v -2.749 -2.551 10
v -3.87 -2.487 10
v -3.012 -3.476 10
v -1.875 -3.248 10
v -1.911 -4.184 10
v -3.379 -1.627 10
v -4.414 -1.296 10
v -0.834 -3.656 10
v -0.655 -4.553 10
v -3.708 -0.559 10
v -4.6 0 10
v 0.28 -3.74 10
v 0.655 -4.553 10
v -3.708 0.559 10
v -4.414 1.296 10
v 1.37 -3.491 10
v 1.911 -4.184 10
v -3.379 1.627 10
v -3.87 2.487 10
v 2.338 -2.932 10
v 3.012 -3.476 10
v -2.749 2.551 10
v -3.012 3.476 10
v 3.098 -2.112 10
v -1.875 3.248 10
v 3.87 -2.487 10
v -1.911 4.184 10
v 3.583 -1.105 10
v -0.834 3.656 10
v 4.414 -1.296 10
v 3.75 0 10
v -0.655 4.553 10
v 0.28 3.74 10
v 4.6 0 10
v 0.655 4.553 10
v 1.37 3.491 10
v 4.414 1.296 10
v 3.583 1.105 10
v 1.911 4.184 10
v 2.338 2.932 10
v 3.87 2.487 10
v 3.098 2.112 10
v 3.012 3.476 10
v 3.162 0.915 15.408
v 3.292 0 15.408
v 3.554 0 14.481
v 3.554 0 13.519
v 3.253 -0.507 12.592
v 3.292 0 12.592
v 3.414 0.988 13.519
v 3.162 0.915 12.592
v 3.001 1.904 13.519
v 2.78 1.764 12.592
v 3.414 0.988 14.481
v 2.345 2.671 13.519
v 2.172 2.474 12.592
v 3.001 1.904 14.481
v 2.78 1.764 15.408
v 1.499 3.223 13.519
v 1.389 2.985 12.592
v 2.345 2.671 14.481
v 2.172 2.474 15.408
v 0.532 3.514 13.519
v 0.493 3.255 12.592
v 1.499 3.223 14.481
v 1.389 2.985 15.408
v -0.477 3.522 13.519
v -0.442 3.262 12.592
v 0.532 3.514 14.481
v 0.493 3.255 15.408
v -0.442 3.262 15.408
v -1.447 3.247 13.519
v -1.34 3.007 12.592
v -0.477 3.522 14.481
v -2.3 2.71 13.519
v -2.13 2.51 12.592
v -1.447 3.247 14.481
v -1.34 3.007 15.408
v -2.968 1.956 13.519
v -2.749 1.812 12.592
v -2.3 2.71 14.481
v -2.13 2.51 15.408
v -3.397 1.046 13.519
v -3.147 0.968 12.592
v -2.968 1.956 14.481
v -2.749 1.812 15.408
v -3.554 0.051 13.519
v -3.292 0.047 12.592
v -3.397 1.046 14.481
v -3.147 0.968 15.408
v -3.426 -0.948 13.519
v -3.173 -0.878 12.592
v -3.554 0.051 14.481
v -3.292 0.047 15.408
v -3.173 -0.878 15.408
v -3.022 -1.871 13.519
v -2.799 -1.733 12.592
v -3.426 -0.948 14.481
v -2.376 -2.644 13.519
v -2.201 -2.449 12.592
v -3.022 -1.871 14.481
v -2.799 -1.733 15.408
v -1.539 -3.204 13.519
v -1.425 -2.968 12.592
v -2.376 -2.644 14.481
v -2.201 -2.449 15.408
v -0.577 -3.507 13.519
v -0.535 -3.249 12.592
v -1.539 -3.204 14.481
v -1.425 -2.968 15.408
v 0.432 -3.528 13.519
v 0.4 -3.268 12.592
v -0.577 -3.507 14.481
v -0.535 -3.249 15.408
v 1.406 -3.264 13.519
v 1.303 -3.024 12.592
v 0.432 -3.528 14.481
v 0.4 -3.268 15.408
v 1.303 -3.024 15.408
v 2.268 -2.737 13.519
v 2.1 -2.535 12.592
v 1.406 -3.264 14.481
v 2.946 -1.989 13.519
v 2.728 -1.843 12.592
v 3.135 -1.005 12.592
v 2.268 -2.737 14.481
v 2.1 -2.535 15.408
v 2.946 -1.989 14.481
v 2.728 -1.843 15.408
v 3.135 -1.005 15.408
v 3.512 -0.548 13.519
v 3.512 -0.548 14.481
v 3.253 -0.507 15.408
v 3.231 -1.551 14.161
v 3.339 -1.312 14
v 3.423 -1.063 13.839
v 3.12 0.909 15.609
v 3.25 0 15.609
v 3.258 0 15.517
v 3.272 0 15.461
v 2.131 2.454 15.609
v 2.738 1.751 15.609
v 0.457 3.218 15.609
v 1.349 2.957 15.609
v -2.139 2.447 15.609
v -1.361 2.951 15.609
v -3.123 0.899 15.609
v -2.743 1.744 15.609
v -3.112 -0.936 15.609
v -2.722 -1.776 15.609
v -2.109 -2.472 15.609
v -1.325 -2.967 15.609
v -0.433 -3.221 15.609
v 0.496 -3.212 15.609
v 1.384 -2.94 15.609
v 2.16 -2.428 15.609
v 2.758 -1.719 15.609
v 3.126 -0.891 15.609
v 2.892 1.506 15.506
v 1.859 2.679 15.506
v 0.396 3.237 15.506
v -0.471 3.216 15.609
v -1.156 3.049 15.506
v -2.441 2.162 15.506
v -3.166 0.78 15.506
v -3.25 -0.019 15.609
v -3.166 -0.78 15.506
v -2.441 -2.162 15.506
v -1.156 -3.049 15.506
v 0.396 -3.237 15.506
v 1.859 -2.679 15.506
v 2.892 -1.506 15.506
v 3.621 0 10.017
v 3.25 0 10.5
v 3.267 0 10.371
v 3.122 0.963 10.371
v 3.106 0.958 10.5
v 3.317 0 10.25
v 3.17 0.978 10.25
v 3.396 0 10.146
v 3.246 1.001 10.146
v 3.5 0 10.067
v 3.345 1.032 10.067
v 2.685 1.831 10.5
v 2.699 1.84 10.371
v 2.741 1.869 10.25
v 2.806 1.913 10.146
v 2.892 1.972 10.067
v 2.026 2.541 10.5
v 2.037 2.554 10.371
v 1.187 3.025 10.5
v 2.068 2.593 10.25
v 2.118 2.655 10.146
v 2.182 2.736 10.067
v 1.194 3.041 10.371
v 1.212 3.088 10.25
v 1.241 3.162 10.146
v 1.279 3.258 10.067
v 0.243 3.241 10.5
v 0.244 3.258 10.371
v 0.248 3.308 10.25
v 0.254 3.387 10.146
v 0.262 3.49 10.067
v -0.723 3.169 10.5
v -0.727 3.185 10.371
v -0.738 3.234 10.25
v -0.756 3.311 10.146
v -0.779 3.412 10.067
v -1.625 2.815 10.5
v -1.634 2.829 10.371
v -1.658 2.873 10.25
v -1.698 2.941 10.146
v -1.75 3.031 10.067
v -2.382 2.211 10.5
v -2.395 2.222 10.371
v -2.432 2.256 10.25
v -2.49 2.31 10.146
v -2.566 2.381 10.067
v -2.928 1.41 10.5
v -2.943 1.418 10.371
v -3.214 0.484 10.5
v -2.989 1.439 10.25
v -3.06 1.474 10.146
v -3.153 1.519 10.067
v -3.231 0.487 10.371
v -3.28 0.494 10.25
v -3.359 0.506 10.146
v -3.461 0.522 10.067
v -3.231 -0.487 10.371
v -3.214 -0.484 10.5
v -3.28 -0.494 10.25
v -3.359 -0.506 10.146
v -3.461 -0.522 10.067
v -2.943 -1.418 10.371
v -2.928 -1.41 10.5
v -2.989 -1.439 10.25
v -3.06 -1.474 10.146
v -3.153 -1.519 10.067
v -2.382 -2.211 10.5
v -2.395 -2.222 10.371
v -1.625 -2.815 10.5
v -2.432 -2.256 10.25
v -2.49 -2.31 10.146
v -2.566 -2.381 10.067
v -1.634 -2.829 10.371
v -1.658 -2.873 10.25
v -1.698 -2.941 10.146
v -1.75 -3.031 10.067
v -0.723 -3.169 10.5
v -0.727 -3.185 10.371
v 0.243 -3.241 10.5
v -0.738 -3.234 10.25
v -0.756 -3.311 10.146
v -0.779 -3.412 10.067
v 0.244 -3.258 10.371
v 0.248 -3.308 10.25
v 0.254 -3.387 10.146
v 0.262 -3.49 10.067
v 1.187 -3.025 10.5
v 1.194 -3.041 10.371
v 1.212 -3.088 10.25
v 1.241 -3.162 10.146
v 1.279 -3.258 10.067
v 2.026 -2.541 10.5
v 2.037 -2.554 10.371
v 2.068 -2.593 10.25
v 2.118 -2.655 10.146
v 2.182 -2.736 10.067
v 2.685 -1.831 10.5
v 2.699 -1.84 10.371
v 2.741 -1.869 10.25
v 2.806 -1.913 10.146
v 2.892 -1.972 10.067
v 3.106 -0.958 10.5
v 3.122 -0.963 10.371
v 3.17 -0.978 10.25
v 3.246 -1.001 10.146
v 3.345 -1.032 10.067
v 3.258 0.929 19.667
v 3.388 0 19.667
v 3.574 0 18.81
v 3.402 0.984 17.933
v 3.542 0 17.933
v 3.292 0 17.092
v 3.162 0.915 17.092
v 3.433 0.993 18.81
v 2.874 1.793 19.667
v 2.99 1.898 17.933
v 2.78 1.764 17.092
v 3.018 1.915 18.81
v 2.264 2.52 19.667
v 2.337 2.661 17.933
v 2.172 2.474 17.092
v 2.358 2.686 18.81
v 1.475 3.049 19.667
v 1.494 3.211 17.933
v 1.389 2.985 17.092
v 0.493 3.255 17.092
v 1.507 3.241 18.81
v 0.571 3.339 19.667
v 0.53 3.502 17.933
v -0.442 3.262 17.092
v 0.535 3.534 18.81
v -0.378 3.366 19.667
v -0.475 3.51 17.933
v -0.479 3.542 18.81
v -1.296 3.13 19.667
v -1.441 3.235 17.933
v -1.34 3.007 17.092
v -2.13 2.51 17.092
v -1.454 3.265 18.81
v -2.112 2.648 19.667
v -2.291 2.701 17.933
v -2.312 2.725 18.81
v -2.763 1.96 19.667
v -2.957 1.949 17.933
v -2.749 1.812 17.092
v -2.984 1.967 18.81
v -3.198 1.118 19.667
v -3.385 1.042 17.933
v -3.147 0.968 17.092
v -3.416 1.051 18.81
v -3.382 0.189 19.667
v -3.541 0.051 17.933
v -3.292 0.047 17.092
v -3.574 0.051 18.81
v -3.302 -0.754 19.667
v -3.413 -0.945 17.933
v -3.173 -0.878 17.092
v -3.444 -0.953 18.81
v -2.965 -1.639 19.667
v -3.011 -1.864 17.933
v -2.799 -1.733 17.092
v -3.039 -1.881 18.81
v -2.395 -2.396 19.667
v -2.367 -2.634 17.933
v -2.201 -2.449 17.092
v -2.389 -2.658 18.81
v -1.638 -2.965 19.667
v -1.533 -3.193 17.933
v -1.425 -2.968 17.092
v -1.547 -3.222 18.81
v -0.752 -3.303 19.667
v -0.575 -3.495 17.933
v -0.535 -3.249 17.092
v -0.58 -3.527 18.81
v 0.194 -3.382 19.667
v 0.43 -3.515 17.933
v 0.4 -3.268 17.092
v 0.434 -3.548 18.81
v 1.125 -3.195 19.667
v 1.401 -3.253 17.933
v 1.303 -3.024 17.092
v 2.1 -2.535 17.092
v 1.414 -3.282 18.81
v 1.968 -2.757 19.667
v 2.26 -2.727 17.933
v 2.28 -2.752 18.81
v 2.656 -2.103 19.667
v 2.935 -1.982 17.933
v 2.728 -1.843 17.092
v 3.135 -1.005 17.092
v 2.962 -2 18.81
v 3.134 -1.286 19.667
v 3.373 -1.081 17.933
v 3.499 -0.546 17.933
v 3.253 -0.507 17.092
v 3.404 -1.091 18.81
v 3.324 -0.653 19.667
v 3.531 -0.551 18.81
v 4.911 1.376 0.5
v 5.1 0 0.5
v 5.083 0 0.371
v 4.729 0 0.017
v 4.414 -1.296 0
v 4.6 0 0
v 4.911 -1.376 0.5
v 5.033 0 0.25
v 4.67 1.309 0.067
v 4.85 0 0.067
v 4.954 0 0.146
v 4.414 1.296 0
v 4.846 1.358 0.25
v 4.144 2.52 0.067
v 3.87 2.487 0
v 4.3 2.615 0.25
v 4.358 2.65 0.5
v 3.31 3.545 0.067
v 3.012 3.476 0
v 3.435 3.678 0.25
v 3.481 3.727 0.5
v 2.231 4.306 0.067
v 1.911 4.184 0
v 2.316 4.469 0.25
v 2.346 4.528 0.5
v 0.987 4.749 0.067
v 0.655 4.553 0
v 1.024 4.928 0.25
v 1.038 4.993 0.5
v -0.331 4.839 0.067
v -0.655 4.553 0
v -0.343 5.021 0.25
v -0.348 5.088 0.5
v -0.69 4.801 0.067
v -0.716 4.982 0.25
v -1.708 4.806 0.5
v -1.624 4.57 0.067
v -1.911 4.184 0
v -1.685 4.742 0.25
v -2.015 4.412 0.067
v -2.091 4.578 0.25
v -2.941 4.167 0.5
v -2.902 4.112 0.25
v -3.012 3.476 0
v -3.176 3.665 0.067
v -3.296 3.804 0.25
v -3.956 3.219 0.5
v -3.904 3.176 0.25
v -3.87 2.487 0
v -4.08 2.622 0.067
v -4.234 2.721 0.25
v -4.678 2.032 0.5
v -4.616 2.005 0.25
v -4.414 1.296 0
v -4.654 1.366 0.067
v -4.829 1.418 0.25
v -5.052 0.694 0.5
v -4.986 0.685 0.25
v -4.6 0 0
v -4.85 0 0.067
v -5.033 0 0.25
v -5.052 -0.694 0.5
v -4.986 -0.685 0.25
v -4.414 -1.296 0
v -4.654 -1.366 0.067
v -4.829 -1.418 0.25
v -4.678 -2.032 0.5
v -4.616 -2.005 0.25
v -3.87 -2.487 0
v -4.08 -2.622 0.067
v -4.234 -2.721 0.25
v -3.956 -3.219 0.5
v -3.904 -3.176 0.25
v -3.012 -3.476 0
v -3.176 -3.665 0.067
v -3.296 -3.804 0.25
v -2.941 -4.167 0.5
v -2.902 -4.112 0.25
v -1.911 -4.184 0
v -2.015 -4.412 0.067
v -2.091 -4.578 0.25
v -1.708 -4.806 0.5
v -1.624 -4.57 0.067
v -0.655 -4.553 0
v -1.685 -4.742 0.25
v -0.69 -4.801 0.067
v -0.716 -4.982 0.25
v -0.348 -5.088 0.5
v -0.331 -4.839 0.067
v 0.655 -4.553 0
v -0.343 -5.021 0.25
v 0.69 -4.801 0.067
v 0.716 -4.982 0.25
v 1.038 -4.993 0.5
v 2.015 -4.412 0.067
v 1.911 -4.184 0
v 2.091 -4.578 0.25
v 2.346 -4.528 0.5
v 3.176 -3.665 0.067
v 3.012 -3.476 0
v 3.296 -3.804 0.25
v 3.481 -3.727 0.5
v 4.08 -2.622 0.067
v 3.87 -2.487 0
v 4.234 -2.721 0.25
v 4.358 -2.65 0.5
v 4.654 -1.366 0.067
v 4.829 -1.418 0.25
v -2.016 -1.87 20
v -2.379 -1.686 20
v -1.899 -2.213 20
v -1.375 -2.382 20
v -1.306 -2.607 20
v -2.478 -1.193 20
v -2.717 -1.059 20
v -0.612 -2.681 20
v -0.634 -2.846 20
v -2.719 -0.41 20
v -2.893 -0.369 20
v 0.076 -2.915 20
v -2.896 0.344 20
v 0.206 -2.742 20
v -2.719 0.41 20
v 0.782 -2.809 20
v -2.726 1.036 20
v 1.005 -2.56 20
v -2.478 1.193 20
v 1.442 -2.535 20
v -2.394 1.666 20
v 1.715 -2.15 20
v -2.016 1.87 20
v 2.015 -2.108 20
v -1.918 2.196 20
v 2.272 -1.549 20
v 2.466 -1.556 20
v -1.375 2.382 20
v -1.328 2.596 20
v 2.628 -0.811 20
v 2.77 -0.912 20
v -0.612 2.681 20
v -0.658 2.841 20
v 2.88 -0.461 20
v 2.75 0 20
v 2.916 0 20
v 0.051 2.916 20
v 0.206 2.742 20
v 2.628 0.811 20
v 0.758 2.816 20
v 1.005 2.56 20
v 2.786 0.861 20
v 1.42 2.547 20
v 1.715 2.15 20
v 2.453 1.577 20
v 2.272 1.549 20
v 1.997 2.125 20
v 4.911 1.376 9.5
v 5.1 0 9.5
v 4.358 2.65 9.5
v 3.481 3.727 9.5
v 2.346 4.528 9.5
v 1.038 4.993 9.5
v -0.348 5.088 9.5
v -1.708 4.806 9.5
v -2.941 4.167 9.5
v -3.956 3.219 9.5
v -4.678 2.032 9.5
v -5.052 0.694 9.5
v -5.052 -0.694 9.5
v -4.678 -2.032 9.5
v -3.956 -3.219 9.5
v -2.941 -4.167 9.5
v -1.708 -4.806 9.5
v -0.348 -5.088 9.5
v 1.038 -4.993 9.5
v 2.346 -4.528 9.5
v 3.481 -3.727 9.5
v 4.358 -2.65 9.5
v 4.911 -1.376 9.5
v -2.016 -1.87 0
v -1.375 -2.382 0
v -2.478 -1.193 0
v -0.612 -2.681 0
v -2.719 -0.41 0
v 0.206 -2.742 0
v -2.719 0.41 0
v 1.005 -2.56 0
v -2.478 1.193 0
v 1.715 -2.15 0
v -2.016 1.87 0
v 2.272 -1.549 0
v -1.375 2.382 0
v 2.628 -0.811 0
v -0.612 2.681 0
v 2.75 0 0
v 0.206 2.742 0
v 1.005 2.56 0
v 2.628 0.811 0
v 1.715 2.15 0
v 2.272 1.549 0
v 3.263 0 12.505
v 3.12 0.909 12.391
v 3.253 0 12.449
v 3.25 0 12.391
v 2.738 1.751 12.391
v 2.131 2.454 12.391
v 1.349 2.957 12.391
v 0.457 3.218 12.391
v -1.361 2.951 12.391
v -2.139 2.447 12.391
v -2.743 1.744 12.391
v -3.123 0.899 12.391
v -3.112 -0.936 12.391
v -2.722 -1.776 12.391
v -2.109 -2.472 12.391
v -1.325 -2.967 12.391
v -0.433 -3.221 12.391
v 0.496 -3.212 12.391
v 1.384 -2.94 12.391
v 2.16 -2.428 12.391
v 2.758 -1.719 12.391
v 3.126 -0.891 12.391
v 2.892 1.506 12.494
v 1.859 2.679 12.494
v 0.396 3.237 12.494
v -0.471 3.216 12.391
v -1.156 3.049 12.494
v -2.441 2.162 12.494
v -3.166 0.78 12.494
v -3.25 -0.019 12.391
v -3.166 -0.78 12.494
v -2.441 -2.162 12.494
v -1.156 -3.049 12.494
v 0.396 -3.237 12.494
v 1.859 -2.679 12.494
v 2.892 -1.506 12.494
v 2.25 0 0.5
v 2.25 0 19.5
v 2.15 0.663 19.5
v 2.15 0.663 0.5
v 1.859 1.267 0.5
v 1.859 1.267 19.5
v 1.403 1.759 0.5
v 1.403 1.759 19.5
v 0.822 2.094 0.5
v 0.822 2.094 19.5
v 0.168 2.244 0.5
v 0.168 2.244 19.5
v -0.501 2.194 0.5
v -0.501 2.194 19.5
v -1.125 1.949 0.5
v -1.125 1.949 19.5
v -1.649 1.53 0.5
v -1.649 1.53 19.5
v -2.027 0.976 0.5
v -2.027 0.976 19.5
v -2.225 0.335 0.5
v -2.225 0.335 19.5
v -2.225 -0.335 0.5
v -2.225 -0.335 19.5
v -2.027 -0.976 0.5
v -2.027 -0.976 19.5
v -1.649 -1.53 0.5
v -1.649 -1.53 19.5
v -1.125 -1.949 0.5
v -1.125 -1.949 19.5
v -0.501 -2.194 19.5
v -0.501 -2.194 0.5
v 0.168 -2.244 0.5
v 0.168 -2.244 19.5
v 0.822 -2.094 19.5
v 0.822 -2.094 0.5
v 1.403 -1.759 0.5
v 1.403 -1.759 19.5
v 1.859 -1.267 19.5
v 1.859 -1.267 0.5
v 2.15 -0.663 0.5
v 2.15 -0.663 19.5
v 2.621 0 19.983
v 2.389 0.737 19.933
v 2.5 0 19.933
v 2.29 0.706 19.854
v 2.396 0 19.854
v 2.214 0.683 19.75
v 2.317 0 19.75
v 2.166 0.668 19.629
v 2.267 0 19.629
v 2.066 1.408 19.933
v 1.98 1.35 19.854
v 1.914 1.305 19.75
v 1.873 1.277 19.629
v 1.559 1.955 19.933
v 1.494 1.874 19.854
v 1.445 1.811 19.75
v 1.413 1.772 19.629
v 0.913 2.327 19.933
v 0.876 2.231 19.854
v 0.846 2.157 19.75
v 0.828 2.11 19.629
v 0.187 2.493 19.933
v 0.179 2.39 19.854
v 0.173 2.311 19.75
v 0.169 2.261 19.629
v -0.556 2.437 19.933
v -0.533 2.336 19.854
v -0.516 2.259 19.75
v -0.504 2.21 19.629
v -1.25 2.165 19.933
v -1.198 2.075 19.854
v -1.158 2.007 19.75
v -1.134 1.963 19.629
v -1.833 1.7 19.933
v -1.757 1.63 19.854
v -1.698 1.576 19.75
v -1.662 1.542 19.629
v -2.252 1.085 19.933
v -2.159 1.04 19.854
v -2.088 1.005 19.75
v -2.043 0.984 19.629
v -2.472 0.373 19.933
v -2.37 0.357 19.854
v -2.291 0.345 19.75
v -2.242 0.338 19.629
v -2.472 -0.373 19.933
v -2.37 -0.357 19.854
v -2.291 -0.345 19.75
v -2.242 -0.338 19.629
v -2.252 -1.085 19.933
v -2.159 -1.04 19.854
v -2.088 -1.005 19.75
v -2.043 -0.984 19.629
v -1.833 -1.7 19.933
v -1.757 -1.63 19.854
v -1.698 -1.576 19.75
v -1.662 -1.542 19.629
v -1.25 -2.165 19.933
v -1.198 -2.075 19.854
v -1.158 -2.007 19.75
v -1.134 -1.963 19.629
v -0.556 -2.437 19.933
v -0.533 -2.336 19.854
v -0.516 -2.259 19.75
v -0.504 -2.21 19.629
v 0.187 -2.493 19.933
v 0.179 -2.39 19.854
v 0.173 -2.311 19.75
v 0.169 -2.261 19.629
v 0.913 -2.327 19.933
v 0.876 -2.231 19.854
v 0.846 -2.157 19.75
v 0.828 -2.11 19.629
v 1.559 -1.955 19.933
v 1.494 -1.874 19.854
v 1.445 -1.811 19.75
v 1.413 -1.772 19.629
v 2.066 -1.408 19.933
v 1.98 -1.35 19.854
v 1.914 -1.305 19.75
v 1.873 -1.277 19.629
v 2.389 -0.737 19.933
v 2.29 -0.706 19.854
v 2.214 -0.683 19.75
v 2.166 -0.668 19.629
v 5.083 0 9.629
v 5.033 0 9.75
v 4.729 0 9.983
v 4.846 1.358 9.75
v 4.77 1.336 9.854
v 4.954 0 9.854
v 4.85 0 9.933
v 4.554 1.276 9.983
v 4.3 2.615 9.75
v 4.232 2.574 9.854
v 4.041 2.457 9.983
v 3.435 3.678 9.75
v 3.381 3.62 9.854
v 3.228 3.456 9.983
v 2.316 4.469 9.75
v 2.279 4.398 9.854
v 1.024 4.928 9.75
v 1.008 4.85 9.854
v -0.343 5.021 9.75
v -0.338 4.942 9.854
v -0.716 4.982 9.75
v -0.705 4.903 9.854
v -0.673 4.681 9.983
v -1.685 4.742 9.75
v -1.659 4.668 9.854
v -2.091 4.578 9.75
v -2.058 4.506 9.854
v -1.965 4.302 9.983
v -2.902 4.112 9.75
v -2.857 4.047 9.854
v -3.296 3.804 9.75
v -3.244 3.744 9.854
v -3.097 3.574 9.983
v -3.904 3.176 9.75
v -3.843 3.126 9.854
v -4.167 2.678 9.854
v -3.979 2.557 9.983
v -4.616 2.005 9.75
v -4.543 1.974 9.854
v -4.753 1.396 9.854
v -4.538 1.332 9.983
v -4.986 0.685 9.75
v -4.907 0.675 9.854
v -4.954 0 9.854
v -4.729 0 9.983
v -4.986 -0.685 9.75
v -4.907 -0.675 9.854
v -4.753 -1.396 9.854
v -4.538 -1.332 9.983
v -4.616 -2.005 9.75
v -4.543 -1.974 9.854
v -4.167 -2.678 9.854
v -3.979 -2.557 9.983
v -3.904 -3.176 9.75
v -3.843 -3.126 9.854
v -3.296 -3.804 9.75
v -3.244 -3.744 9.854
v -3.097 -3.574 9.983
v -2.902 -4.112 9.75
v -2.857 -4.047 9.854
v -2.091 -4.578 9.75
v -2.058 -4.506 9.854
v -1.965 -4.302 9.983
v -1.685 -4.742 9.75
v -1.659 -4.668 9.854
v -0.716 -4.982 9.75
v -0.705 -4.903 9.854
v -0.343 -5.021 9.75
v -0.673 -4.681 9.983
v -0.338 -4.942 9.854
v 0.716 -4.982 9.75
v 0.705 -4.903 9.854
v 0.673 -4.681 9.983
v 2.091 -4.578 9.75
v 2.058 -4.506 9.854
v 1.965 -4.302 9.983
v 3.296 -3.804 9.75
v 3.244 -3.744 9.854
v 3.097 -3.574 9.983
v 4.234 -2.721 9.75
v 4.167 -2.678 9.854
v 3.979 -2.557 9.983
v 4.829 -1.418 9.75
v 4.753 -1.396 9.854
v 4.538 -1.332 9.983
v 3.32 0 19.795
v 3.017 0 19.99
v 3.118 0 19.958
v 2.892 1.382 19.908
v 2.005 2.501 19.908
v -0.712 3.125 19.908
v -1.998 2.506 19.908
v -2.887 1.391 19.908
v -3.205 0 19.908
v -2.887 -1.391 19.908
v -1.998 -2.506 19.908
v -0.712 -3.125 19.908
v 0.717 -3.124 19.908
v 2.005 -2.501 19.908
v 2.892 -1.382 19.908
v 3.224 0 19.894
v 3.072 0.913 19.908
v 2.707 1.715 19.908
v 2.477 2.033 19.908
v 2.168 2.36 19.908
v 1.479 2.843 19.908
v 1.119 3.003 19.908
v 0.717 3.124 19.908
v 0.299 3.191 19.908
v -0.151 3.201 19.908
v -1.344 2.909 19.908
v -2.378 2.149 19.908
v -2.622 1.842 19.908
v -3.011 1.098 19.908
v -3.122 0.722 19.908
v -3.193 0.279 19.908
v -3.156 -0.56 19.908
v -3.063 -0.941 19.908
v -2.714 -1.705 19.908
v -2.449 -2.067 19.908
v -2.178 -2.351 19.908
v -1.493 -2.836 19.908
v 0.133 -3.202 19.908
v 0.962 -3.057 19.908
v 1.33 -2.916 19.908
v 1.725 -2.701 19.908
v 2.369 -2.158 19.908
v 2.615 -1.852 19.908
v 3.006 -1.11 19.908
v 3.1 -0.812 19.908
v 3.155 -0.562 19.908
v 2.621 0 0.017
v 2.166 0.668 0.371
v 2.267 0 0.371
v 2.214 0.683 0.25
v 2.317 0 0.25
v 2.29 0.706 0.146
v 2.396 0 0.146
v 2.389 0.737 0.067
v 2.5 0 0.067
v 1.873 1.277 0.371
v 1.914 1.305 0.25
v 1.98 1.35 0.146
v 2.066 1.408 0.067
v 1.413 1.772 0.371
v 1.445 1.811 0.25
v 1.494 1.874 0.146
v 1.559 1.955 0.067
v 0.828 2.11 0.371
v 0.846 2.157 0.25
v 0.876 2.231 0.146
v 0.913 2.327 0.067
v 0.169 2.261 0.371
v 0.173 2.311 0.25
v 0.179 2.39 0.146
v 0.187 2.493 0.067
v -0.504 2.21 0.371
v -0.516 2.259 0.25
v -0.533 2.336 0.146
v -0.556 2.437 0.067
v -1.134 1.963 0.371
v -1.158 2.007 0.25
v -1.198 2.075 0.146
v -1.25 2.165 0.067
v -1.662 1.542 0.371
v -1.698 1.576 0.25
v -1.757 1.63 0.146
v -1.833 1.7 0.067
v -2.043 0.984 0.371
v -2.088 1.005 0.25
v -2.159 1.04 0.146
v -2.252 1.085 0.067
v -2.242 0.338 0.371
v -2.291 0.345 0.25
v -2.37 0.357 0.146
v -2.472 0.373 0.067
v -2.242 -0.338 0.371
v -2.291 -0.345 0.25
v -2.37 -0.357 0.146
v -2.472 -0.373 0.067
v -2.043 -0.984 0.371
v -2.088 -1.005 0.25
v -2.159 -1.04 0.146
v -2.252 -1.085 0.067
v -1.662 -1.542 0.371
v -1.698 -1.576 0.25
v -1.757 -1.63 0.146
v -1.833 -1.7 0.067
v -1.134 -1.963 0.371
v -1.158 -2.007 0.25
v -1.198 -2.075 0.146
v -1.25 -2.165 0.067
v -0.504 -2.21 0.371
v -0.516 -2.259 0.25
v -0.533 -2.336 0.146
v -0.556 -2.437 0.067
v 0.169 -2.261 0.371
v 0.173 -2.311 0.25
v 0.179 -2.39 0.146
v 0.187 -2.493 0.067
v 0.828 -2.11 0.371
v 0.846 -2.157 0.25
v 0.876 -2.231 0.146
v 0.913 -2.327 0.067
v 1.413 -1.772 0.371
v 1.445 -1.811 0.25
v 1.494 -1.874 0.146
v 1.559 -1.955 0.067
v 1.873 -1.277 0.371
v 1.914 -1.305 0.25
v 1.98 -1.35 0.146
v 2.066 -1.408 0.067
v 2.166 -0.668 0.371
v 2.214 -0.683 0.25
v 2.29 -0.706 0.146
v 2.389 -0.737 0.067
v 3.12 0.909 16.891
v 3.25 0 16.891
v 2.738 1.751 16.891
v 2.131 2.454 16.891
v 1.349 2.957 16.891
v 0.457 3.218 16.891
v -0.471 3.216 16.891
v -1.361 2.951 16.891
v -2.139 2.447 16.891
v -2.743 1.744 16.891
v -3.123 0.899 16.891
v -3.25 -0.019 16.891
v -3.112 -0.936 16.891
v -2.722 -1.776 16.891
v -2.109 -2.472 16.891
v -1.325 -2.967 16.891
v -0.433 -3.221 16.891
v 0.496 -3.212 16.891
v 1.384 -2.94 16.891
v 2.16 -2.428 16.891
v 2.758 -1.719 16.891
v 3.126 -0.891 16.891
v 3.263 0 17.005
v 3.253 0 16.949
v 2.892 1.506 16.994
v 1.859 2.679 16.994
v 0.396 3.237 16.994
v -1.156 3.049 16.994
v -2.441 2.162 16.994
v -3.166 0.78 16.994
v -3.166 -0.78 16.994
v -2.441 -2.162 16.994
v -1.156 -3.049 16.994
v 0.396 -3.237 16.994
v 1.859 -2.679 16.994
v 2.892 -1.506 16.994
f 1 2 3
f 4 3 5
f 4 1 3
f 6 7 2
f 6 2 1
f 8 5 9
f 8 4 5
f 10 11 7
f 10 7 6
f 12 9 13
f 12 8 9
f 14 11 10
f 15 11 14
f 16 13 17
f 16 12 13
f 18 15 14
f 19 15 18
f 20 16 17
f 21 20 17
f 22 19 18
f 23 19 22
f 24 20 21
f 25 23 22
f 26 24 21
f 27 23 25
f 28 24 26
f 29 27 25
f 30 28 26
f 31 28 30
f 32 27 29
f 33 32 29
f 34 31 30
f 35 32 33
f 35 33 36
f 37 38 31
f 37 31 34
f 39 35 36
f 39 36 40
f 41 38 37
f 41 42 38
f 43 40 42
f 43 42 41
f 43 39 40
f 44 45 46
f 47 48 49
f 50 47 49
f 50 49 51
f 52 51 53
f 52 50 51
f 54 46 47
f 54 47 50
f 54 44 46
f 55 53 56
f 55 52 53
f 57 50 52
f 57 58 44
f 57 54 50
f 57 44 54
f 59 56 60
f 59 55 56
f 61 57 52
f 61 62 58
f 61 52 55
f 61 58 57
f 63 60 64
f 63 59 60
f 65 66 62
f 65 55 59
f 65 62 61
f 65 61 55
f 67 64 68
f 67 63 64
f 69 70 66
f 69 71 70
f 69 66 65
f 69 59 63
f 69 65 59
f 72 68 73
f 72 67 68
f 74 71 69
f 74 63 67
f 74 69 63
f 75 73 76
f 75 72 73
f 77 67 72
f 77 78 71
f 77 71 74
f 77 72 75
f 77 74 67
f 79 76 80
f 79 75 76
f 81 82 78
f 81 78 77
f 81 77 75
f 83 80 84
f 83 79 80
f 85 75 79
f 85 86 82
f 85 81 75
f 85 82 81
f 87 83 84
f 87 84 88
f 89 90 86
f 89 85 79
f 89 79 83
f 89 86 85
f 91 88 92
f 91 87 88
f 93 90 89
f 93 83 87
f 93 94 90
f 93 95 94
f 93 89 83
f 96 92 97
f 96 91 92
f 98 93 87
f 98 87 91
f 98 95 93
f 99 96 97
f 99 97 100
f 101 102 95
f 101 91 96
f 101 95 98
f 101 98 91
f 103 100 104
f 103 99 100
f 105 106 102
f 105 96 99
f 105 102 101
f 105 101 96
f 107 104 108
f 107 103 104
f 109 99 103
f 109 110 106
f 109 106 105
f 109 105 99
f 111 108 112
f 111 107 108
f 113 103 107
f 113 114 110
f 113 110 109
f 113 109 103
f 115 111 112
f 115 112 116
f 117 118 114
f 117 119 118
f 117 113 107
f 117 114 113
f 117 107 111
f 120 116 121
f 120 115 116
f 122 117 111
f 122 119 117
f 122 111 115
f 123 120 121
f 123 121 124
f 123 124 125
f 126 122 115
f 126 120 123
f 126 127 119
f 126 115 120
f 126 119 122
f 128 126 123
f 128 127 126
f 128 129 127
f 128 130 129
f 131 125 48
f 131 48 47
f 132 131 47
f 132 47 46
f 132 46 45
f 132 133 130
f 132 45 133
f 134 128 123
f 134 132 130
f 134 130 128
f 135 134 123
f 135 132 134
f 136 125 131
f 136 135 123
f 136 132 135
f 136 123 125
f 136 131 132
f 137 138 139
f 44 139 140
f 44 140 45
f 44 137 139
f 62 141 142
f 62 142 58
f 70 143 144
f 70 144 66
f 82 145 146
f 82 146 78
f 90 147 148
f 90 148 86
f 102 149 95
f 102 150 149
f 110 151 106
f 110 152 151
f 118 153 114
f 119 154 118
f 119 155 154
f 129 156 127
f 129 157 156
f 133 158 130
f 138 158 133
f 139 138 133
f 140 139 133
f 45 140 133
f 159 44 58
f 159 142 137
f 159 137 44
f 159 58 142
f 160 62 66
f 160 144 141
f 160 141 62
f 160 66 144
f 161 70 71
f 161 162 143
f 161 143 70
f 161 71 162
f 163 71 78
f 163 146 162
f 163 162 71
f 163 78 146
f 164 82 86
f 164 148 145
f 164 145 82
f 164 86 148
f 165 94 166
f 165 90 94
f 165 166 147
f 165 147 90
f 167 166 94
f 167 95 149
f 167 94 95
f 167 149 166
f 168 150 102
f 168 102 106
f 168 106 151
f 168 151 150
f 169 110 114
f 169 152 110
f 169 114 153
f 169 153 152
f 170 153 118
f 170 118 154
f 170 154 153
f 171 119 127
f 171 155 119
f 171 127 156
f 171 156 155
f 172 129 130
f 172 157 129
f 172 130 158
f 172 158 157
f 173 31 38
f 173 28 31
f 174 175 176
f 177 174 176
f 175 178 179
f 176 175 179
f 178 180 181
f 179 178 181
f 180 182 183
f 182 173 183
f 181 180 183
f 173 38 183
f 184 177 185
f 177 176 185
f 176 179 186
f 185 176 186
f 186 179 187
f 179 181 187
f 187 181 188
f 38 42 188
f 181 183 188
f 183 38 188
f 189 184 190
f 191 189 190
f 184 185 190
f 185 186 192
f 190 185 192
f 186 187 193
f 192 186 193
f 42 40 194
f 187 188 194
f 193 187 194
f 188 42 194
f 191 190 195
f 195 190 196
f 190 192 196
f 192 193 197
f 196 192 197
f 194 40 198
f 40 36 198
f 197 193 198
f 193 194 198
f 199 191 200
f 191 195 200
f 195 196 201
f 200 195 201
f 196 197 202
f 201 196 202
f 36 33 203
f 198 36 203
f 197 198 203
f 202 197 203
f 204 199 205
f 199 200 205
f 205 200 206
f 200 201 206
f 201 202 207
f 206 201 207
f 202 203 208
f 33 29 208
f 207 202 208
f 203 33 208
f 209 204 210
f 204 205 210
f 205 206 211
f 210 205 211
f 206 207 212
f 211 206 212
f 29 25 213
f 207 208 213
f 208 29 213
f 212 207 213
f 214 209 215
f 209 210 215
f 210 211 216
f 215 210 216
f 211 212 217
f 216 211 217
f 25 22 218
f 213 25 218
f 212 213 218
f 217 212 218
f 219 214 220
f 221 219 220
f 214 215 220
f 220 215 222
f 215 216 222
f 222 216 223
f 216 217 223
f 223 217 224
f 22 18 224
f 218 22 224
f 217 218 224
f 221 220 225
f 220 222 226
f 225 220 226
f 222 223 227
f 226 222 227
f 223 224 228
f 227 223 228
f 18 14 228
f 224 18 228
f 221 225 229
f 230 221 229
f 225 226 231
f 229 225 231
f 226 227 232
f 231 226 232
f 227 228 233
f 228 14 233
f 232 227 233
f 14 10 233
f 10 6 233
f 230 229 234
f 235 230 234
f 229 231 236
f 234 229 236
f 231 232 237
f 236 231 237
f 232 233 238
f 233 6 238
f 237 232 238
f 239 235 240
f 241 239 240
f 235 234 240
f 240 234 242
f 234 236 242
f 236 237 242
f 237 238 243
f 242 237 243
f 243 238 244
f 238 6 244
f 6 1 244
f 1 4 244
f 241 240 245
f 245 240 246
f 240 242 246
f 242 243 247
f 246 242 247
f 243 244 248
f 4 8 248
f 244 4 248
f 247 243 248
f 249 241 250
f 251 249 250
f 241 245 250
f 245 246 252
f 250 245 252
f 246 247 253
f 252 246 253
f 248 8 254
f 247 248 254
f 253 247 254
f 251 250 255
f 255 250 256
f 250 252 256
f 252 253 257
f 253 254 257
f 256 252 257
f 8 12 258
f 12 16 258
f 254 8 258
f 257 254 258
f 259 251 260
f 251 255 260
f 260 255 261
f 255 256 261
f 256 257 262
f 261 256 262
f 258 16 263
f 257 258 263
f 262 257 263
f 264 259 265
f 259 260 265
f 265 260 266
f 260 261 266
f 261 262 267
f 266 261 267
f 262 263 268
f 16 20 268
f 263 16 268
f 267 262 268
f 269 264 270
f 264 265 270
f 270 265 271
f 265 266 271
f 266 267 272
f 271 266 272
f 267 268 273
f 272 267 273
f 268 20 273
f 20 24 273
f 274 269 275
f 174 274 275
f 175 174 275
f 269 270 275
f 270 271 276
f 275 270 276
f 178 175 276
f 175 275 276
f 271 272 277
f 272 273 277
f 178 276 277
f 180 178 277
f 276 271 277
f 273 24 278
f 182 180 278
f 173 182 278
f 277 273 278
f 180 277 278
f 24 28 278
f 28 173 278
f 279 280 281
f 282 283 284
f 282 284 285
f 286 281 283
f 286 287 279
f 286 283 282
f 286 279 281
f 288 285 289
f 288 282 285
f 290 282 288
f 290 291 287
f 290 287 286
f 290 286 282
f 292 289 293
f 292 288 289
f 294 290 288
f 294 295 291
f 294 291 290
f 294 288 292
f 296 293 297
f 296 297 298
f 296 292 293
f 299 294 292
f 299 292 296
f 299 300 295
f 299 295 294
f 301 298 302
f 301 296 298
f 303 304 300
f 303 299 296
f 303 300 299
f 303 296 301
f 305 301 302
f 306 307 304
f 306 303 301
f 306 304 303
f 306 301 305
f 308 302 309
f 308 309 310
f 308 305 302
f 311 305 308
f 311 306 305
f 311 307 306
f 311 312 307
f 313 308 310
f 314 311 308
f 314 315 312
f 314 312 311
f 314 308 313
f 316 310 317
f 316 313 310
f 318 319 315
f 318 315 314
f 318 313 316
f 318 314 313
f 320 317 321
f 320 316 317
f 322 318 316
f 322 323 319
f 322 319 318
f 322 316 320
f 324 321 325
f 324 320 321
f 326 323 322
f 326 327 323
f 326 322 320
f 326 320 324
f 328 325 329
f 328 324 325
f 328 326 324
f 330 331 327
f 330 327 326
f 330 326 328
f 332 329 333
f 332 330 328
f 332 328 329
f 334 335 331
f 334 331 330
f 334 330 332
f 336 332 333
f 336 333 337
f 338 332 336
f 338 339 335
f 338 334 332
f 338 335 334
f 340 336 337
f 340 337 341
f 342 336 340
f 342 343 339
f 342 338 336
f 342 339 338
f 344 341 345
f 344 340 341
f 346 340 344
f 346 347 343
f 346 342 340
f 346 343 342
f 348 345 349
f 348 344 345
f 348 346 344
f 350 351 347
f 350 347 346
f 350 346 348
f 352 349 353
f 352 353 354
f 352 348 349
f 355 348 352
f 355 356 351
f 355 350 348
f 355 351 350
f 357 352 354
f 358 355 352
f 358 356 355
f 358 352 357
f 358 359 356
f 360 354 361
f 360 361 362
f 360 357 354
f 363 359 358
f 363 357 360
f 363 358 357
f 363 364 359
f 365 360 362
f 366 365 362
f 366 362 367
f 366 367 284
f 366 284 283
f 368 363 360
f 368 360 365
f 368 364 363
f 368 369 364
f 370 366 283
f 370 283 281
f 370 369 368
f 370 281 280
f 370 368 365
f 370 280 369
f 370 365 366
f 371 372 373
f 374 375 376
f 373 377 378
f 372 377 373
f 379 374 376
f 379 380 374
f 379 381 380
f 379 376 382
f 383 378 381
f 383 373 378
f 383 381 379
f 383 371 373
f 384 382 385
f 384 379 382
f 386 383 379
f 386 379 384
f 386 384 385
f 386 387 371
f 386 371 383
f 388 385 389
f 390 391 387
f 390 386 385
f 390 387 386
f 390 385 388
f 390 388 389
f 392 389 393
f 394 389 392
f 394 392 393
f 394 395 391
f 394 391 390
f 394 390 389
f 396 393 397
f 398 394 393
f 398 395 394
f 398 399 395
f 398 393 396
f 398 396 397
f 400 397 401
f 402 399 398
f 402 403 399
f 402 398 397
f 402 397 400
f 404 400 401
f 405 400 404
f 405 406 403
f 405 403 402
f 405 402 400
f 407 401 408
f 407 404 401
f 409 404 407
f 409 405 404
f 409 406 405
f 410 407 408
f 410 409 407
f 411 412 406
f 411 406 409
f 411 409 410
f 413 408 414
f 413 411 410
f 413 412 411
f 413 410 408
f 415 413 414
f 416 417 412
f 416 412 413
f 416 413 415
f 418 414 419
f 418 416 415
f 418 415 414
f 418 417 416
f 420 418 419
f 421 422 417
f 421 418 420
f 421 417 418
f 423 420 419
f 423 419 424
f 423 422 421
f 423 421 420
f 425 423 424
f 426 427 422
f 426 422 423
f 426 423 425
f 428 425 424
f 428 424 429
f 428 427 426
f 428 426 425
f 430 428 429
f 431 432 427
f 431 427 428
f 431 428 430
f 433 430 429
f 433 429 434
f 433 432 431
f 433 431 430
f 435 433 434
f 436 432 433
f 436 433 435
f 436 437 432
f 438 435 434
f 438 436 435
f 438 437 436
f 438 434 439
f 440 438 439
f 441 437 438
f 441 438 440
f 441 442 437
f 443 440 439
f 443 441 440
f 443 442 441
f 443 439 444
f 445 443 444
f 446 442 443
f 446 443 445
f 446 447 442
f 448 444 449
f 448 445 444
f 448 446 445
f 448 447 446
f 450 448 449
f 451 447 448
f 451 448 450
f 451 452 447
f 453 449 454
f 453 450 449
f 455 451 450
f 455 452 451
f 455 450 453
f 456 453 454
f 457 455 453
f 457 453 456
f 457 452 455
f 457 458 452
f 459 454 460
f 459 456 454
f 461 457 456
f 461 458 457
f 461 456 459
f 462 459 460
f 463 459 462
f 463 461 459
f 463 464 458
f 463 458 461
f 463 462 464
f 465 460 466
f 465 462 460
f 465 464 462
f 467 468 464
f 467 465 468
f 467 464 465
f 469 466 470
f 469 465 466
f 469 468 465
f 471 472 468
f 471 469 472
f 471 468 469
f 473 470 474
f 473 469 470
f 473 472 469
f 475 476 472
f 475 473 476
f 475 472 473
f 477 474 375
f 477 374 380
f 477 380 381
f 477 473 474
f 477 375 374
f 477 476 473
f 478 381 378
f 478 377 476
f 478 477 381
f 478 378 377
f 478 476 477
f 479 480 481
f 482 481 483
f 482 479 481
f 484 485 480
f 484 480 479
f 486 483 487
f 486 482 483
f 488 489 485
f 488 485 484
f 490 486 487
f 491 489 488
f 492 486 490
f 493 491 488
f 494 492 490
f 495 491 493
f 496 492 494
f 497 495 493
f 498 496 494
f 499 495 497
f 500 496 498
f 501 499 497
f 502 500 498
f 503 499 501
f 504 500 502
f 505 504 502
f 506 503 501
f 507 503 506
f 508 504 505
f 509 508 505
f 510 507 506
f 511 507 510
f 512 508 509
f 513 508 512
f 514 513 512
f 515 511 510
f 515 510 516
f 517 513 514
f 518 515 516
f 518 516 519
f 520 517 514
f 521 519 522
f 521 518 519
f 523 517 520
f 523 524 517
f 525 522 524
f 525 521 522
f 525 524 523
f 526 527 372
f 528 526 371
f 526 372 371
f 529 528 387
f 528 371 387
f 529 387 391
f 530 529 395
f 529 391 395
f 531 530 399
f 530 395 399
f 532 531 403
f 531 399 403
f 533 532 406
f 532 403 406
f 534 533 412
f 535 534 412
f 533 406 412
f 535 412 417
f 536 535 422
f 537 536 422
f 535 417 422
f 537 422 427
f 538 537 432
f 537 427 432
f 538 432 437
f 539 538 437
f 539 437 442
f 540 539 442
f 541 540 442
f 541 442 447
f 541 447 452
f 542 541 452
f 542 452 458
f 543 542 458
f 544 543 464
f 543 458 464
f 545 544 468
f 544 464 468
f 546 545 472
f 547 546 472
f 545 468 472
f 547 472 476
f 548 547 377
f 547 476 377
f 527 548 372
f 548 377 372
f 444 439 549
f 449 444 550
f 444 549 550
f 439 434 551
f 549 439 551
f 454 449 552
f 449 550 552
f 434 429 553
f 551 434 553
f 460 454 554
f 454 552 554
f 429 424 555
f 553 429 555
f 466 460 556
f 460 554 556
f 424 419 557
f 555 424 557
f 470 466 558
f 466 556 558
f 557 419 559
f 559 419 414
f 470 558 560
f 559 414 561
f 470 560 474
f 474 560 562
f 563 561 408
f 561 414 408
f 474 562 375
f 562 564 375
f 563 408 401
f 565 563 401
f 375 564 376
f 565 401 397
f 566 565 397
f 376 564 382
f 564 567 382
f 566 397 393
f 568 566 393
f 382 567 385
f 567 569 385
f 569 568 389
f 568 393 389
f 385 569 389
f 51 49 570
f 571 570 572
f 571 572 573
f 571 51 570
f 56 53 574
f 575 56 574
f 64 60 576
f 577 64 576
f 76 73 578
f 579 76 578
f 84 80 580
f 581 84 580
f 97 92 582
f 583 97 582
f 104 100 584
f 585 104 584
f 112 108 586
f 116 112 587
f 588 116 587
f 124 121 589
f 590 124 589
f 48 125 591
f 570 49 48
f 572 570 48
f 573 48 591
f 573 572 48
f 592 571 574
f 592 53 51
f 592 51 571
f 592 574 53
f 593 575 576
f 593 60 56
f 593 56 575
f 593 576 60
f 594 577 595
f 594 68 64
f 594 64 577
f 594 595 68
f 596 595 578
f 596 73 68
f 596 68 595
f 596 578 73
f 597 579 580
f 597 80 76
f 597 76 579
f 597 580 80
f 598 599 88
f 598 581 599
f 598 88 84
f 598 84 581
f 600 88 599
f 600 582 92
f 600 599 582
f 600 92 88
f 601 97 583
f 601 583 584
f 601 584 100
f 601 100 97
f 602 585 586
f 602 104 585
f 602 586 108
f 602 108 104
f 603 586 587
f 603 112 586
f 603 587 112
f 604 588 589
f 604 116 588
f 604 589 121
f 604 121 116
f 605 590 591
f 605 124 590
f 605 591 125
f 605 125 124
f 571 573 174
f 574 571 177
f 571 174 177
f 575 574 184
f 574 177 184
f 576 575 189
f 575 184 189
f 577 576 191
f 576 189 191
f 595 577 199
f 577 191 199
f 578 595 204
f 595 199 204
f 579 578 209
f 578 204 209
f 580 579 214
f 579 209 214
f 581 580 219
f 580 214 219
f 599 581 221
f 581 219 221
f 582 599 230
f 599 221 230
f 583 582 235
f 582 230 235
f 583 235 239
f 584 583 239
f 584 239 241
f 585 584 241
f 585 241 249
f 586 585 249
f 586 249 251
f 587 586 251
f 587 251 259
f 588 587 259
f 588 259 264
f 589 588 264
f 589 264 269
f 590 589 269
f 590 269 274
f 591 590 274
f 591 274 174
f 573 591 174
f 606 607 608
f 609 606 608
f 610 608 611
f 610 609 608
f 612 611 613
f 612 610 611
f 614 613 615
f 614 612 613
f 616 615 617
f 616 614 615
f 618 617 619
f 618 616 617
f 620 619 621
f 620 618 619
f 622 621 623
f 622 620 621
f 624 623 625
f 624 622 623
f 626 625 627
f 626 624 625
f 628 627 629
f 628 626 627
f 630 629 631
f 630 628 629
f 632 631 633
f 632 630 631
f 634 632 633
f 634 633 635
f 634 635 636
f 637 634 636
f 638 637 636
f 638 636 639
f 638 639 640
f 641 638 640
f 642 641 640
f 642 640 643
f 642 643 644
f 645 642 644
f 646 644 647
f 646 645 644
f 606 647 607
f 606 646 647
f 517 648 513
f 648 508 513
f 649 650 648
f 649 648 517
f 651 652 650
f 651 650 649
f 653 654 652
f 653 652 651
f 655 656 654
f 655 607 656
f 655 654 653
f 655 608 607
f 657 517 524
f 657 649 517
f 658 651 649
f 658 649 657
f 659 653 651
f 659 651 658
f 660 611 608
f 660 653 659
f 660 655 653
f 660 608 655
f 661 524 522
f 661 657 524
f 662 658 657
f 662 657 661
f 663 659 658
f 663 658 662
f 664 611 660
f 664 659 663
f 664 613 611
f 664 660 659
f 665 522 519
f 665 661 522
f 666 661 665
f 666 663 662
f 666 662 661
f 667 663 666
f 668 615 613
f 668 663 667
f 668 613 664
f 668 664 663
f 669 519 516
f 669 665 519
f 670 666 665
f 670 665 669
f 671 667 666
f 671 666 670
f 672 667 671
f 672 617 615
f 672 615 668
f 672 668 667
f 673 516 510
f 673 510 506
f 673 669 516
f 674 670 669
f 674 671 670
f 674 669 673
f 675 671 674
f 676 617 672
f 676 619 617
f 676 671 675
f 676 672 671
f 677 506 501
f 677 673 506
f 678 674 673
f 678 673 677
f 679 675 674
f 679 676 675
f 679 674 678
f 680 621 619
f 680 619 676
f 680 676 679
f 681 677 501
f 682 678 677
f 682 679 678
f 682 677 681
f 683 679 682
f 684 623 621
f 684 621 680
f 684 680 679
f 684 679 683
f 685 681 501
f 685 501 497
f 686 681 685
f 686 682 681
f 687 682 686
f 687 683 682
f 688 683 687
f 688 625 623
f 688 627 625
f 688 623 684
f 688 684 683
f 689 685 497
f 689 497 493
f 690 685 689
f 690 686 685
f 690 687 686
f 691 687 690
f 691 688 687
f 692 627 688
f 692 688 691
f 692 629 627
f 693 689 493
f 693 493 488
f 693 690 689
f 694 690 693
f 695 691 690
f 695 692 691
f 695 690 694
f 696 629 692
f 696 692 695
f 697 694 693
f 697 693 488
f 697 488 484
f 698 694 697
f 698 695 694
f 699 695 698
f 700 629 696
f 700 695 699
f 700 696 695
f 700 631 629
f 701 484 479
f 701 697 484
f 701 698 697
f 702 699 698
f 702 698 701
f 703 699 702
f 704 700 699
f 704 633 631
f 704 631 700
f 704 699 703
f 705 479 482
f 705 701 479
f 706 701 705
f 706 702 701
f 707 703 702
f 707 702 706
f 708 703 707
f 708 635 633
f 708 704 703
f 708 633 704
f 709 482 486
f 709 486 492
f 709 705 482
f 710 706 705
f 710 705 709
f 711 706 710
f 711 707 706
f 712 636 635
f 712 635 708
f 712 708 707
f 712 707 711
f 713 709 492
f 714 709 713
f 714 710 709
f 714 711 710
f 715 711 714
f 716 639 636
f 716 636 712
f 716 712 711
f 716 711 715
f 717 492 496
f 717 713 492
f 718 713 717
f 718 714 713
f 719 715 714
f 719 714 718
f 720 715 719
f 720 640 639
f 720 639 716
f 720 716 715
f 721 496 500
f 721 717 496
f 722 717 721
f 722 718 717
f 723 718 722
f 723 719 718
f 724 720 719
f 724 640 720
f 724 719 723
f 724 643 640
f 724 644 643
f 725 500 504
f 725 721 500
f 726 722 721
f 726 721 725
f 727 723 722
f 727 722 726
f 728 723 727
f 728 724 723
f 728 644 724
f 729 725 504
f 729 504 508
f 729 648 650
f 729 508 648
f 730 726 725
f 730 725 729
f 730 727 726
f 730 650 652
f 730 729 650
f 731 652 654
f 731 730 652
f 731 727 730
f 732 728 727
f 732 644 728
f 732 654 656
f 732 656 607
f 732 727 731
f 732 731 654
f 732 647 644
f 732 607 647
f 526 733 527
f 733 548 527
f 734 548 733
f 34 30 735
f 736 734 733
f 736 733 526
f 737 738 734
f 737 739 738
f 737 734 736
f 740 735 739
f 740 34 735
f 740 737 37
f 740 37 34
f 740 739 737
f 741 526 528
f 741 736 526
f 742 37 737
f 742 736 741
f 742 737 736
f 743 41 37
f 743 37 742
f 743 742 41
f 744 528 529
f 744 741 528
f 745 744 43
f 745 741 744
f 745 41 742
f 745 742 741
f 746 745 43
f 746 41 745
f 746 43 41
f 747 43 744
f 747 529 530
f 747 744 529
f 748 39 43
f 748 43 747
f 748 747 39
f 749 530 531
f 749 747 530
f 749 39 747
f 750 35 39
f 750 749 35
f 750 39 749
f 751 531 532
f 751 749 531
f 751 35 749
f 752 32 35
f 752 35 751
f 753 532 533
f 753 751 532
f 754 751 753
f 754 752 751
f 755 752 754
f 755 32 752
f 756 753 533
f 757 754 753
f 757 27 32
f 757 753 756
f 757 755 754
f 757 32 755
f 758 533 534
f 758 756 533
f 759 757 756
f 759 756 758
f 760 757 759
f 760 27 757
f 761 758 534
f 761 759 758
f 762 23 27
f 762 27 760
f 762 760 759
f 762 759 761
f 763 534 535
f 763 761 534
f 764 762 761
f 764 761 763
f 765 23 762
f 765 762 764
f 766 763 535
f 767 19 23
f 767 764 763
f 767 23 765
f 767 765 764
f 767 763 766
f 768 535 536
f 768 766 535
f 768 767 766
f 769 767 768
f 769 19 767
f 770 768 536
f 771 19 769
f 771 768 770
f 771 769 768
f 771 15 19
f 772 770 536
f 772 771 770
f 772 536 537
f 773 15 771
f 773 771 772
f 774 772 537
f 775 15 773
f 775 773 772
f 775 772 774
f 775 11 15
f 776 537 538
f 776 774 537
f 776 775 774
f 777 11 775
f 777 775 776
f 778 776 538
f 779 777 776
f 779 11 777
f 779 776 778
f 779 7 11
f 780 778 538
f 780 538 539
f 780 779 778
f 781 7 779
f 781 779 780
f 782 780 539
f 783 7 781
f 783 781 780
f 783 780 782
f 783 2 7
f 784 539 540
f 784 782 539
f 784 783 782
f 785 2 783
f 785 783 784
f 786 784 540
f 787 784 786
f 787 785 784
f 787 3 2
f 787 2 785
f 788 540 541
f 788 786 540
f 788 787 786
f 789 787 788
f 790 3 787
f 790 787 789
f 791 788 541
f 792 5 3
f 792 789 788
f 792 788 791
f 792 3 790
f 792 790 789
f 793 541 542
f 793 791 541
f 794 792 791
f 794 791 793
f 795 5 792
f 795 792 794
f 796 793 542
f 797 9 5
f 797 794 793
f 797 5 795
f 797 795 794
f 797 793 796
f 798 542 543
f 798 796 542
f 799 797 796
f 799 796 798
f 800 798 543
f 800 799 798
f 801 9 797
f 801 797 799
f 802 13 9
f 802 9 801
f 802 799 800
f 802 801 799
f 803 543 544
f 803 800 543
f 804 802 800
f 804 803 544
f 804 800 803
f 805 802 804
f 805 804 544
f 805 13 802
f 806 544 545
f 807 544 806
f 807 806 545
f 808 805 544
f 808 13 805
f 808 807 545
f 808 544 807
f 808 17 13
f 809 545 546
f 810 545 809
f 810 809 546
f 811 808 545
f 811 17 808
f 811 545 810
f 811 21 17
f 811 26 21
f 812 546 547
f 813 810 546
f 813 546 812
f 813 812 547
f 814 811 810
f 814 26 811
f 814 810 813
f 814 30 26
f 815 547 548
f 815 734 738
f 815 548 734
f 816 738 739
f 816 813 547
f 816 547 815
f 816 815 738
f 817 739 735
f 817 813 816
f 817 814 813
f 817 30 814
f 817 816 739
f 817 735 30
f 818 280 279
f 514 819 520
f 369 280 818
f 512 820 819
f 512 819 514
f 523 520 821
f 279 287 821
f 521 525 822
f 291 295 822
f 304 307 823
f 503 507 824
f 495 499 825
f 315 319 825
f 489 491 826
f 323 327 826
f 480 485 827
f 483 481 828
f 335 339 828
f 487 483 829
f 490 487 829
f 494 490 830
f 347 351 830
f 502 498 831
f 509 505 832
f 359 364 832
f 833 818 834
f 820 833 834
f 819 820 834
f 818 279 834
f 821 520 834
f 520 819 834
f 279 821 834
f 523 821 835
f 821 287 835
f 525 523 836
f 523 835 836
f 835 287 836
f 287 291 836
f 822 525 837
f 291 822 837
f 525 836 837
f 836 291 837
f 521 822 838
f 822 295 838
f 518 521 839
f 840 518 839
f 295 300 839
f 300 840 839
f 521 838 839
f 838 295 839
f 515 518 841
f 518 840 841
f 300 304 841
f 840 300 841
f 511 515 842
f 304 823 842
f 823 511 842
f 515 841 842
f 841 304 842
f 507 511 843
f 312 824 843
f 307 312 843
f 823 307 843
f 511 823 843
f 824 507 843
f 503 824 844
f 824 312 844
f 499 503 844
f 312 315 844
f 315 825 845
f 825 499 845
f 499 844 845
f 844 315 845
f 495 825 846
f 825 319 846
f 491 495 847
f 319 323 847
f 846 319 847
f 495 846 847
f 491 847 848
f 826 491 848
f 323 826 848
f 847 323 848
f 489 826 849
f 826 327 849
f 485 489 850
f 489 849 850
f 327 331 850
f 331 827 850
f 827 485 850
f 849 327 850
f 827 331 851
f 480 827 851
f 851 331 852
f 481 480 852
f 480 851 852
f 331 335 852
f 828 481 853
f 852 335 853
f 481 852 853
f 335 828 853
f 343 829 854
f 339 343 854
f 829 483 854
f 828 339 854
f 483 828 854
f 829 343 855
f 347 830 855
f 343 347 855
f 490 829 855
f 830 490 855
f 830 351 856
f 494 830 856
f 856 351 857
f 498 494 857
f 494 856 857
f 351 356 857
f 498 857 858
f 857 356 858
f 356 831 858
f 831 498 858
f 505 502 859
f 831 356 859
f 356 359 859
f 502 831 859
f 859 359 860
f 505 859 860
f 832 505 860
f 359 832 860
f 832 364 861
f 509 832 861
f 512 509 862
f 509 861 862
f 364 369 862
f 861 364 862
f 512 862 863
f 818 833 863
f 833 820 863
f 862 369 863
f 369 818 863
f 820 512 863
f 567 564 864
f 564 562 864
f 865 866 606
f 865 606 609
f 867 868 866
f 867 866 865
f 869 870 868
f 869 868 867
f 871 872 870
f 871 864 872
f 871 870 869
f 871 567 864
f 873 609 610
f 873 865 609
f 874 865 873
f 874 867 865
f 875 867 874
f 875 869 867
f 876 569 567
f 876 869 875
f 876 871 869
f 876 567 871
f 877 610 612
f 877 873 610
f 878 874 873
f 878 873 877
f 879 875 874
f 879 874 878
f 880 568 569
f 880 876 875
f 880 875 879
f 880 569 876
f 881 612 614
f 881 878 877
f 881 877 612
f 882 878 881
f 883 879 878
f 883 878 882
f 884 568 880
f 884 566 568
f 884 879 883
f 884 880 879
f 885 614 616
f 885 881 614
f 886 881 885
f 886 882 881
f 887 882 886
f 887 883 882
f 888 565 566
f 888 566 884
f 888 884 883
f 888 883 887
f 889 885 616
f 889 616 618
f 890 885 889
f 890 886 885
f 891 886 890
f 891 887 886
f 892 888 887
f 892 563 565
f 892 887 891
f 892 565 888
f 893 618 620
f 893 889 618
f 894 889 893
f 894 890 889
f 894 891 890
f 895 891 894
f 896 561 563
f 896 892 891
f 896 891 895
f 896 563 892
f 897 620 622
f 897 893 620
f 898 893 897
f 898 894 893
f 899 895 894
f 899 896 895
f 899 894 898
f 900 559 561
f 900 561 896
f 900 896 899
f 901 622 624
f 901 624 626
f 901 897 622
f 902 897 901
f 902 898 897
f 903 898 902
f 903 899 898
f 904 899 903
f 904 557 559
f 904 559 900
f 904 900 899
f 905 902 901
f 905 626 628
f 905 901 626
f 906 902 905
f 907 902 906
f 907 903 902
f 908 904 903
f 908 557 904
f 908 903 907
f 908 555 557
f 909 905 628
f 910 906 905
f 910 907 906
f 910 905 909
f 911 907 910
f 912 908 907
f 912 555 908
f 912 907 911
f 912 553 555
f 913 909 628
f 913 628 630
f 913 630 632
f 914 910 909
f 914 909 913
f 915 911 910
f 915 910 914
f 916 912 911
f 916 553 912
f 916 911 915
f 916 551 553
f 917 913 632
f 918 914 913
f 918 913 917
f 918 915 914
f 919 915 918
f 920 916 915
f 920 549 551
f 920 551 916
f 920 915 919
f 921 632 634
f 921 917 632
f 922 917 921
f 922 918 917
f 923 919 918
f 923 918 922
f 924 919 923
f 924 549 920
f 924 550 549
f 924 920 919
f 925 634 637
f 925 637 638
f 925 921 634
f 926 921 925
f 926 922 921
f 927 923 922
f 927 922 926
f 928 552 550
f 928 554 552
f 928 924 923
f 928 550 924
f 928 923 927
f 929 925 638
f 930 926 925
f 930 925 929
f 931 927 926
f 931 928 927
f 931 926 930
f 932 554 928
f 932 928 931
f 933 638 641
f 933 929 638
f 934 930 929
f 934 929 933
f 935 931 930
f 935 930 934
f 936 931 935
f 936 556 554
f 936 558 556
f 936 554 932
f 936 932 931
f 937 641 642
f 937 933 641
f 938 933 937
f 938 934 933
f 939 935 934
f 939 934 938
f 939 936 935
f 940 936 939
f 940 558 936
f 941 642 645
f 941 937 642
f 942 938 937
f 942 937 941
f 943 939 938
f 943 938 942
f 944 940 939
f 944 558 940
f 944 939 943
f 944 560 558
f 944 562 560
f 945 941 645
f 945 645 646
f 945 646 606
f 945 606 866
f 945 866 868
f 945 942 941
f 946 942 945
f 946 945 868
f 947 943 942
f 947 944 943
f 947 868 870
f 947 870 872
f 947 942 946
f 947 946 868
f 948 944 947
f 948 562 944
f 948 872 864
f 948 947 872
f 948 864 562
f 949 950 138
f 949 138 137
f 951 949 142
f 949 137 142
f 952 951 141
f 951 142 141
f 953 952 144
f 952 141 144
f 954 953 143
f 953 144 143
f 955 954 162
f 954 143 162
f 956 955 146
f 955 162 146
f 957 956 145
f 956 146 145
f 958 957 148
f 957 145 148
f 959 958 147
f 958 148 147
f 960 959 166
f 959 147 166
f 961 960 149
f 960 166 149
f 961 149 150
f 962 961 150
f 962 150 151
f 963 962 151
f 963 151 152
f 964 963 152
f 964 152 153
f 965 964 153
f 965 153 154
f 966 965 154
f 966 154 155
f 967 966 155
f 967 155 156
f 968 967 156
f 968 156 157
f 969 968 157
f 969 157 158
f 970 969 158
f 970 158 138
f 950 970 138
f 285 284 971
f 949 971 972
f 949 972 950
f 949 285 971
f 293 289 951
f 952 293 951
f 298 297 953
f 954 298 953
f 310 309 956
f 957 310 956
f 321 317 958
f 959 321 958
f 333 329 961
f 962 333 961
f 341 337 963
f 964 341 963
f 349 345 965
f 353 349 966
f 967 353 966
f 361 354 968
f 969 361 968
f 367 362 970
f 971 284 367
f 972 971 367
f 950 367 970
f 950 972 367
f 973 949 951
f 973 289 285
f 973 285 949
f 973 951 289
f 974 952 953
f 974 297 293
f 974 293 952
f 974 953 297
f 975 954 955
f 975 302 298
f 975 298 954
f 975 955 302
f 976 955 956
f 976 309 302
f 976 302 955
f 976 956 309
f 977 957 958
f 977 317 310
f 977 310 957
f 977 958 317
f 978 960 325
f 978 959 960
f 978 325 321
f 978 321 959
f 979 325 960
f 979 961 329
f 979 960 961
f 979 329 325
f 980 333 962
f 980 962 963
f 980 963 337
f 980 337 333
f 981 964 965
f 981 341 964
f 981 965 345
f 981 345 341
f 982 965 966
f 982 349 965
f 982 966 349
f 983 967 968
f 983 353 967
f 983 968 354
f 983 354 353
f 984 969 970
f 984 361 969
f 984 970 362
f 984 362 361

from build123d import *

# Parameters (mm, degrees)
F0_R     = 3.25
F0_R_2   = 2.25
F1_DEPTH = 20
F0_R_3   = 5.1
F2_DEPTH = 10
F5_R     = 0.5


with BuildPart() as f1:
    # F0 (on Top) → F1 (new body)
    with BuildSketch(Plane.XY):
        Circle(F0_R)
        Circle(F0_R_2, mode=Mode.SUBTRACT)
    extrude(amount=F1_DEPTH)

    # F0 (on Top) → F2 (join)
    with BuildSketch(Plane.XY):
        Circle(F0_R_3)
        Circle(F0_R, mode=Mode.SUBTRACT)
    extrude(amount=F2_DEPTH)

    # F3 (on Front) → F4 (revolve)
    with BuildSketch(Plane.XZ):
        with BuildLine():
            Line((3.25, 20), (3.25, 17))
            ThreePointArc((3.25, 17), (3.587722, 18.5), (3.25, 20))
        make_face()
        with BuildLine():
            Line((3.25, 15.5), (3.25, 12.5))
            ThreePointArc((3.25, 12.5), (3.587722, 14), (3.25, 15.5))
        make_face()
    revolve(axis=Axis((0, 0, 14.141115), (0, 0, 1)))

    # F5
    f5_edges = [f1.edges().sort_by_distance(p)[0] for p in [
        (-5.1, 0, 10),
        (-3.25, 0, 10),
        (3.587722, 0, 18.5),
        (-3.25, 0, 20),
        (-3.25, 0, 17),
        (-2.25, 0, 20),
        (2.25, 0, 10),
        (-2.25, 0, 0),
        (-3.25, 0, 12.5),
        (-3.25, 0, 15.5),
        (3.587722, 0, 14),
        (5.1, 0, 5),
        (-5.1, 0, 0),
        (3.25, 0, 11.25),
    ]]
    fillet(f5_edges, radius=F5_R)


solid = f1.part
